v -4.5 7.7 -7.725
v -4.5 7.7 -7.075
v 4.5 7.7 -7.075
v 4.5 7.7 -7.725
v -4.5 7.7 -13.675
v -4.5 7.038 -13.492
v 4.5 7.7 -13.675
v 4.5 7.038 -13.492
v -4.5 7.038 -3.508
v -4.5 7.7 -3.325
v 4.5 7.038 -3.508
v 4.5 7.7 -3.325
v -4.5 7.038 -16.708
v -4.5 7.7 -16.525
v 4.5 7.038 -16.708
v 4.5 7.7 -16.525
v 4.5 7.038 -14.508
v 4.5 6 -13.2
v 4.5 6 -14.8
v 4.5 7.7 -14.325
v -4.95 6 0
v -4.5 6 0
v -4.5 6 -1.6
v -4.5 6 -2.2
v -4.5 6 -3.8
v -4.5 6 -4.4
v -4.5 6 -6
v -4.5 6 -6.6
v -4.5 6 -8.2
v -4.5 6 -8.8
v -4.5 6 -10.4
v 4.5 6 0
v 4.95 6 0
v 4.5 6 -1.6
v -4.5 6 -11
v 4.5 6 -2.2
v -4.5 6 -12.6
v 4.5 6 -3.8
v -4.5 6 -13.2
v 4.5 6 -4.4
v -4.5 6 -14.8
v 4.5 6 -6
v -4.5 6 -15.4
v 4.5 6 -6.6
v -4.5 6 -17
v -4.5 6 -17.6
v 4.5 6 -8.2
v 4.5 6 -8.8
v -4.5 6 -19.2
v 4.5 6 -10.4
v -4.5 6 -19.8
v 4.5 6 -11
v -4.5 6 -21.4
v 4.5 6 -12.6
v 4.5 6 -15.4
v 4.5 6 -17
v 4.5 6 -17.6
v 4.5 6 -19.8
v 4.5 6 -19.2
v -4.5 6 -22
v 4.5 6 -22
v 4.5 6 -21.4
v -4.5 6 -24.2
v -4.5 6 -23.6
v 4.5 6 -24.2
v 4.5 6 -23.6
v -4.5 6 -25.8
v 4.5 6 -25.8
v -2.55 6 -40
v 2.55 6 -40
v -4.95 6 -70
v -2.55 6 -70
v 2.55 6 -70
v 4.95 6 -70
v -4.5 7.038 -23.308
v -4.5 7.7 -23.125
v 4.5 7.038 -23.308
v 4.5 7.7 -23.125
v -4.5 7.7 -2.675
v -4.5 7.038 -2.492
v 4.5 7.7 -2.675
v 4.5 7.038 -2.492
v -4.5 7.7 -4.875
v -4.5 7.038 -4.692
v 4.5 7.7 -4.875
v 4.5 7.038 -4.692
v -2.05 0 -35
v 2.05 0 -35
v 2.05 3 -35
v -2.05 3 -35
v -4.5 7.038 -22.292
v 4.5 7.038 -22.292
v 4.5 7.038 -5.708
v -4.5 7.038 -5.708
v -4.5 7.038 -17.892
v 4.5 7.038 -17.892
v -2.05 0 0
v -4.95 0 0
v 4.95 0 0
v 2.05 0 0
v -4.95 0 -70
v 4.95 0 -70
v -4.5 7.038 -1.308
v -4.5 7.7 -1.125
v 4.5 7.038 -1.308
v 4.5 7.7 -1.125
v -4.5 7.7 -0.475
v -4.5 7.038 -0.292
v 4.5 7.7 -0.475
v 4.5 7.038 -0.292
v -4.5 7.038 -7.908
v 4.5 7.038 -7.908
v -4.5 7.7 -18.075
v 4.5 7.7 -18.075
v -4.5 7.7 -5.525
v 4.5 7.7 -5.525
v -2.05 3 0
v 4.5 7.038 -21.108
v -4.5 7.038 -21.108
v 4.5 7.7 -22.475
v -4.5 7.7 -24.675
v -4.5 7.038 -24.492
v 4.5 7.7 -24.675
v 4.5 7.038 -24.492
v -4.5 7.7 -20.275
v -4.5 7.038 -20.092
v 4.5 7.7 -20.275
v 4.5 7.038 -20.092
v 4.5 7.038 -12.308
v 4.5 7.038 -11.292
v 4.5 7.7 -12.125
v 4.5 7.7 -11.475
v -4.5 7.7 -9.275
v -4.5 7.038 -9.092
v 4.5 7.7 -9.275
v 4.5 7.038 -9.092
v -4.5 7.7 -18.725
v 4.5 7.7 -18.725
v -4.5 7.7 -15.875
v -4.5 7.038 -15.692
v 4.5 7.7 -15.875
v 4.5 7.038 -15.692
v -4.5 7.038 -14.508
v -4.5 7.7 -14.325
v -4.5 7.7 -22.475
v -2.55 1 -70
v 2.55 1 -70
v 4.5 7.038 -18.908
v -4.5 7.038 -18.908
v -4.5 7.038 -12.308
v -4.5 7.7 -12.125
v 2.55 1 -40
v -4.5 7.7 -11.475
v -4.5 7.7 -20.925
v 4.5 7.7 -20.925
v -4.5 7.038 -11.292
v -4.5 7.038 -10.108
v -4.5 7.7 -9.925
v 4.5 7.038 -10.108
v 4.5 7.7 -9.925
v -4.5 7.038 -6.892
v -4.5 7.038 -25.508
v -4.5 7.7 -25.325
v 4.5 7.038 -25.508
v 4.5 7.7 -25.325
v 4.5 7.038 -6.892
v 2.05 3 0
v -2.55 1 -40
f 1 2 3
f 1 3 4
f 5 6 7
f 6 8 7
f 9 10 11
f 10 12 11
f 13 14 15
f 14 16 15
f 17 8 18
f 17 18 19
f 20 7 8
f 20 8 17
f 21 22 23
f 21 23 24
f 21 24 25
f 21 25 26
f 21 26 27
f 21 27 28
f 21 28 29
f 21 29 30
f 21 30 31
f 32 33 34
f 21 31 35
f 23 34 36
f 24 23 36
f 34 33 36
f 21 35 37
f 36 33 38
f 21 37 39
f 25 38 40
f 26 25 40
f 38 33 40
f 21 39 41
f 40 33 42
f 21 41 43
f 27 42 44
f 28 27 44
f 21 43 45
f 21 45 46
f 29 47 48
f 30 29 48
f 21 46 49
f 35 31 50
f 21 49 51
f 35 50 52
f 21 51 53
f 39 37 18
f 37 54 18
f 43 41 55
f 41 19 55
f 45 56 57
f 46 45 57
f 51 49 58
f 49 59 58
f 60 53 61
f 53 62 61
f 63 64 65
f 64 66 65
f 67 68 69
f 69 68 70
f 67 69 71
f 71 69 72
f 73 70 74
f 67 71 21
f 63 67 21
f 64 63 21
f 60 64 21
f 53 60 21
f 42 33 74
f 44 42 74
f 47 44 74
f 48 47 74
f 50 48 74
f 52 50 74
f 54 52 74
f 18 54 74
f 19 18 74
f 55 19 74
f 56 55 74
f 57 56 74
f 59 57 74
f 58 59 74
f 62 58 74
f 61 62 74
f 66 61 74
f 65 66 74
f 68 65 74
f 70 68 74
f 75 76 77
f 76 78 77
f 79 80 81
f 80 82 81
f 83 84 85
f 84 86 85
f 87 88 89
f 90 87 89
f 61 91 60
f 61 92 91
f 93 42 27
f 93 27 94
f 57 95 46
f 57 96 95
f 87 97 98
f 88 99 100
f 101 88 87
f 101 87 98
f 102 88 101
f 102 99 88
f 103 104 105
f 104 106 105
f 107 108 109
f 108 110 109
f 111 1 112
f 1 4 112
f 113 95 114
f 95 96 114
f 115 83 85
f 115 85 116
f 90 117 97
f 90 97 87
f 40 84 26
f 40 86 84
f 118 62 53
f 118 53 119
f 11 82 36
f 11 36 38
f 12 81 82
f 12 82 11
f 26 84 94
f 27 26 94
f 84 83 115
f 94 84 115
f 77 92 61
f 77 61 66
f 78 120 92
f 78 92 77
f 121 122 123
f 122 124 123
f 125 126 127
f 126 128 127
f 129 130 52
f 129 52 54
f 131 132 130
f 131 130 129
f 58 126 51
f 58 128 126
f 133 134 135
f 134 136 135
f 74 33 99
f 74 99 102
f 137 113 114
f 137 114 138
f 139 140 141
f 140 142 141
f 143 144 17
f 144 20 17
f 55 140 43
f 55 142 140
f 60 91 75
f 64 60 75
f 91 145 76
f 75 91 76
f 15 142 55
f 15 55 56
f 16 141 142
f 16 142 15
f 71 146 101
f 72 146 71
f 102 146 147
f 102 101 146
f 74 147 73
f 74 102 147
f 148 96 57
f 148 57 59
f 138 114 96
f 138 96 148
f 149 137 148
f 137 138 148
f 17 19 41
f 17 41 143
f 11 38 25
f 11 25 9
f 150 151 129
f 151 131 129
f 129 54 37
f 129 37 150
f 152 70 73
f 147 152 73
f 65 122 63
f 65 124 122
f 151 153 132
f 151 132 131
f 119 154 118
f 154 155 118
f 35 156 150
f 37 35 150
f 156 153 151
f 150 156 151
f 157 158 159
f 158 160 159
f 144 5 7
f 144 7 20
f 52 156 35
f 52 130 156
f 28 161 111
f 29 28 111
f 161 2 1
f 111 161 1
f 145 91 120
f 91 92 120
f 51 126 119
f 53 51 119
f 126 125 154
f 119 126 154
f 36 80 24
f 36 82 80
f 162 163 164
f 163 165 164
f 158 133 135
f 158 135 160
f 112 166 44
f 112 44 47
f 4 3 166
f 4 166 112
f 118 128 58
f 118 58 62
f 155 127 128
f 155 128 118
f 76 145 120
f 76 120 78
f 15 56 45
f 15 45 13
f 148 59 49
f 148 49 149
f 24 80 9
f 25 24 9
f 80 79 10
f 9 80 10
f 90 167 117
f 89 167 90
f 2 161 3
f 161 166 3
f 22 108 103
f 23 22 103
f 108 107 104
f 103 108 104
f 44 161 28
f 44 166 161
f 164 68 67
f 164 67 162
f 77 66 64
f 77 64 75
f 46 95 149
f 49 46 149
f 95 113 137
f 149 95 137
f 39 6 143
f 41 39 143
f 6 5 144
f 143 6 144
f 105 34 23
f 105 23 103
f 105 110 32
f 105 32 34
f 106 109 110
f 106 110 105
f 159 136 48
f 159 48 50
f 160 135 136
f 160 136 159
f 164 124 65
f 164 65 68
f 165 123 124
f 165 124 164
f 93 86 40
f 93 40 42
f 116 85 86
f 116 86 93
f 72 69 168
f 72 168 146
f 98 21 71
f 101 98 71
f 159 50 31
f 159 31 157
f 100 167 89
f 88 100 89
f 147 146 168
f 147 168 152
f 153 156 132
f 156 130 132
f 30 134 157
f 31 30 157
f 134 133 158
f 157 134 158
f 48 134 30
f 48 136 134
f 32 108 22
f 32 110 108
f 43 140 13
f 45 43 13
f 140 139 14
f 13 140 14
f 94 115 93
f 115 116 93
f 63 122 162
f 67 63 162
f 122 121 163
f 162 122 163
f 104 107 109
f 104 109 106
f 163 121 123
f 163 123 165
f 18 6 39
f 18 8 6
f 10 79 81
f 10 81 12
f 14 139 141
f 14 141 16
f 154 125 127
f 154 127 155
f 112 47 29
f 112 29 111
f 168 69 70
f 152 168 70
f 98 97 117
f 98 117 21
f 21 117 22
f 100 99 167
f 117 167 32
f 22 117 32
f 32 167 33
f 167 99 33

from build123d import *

# Parameters (mm, degrees)
EXTRUDE_2_DEPTH        = 4.95
EXTRUDE_3_DEPTH        = 4.5
PATTERN_LINEAR_1_COUNT = 12
PATTERN_LINEAR_1_PITCH = 2.2
SKETCH_7_W             = 5.1
SKETCH_7_H             = 30
CUT_EXTRUDE_1_DEPTH    = 5
SKETCH_3_W             = 35
SKETCH_3_H             = 3
CUT_EXTRUDE_2_DEPTH    = 2.05


with BuildPart() as part:
    # 스케치2 → 보스-돌출2 (new, symmetric)
    with BuildSketch(Plane(origin=(0, 0, 0), x_dir=(0, 0, -1), z_dir=(1, 0, 0))):
        Polygon((0, 6), (0, 0), (70, 0), (70, 6), (1.6, 6), align=None)
    extrude(amount=EXTRUDE_2_DEPTH, both=True)

    # 스케치2<4> → 보스-돌출3 (add, symmetric)
    with BuildSketch(Plane(origin=(0, 0, 0), x_dir=(0, 0, -1), z_dir=(1, 0, 0))):
        Polygon((0.291798614, 7.03781361), (0, 6), (1.6, 6), (1.308201386, 7.03781361), (1.125, 7.7), (0.475, 7.7), align=None)
    extrude_3 = extrude(amount=EXTRUDE_3_DEPTH, both=True)

    # 선형 패턴1: 보스-돌출3 ×12
    with Locations(*[(0, 0, -i * PATTERN_LINEAR_1_PITCH) for i in range(1, PATTERN_LINEAR_1_COUNT)]):
        add(extrude_3)

    # 스케치7 → 컷-돌출1 (cut)
    with BuildSketch(Plane(origin=(0, 6, 0), x_dir=(1, 0, 0), z_dir=(0, 1, 0))):
        with Locations((0, 55)):
            Rectangle(SKETCH_7_W, SKETCH_7_H)
    extrude(amount=-CUT_EXTRUDE_1_DEPTH, mode=Mode.SUBTRACT)

    # 스케치3 → 컷-돌출2 (cut, symmetric)
    with BuildSketch(Plane(origin=(0, 0, 0), x_dir=(0, 0, -1), z_dir=(1, 0, 0))):
        with Locations((17.5, 1.5)):
            Rectangle(SKETCH_3_W, SKETCH_3_H)
    extrude(amount=CUT_EXTRUDE_2_DEPTH, both=True, mode=Mode.SUBTRACT)


solid = part.part
